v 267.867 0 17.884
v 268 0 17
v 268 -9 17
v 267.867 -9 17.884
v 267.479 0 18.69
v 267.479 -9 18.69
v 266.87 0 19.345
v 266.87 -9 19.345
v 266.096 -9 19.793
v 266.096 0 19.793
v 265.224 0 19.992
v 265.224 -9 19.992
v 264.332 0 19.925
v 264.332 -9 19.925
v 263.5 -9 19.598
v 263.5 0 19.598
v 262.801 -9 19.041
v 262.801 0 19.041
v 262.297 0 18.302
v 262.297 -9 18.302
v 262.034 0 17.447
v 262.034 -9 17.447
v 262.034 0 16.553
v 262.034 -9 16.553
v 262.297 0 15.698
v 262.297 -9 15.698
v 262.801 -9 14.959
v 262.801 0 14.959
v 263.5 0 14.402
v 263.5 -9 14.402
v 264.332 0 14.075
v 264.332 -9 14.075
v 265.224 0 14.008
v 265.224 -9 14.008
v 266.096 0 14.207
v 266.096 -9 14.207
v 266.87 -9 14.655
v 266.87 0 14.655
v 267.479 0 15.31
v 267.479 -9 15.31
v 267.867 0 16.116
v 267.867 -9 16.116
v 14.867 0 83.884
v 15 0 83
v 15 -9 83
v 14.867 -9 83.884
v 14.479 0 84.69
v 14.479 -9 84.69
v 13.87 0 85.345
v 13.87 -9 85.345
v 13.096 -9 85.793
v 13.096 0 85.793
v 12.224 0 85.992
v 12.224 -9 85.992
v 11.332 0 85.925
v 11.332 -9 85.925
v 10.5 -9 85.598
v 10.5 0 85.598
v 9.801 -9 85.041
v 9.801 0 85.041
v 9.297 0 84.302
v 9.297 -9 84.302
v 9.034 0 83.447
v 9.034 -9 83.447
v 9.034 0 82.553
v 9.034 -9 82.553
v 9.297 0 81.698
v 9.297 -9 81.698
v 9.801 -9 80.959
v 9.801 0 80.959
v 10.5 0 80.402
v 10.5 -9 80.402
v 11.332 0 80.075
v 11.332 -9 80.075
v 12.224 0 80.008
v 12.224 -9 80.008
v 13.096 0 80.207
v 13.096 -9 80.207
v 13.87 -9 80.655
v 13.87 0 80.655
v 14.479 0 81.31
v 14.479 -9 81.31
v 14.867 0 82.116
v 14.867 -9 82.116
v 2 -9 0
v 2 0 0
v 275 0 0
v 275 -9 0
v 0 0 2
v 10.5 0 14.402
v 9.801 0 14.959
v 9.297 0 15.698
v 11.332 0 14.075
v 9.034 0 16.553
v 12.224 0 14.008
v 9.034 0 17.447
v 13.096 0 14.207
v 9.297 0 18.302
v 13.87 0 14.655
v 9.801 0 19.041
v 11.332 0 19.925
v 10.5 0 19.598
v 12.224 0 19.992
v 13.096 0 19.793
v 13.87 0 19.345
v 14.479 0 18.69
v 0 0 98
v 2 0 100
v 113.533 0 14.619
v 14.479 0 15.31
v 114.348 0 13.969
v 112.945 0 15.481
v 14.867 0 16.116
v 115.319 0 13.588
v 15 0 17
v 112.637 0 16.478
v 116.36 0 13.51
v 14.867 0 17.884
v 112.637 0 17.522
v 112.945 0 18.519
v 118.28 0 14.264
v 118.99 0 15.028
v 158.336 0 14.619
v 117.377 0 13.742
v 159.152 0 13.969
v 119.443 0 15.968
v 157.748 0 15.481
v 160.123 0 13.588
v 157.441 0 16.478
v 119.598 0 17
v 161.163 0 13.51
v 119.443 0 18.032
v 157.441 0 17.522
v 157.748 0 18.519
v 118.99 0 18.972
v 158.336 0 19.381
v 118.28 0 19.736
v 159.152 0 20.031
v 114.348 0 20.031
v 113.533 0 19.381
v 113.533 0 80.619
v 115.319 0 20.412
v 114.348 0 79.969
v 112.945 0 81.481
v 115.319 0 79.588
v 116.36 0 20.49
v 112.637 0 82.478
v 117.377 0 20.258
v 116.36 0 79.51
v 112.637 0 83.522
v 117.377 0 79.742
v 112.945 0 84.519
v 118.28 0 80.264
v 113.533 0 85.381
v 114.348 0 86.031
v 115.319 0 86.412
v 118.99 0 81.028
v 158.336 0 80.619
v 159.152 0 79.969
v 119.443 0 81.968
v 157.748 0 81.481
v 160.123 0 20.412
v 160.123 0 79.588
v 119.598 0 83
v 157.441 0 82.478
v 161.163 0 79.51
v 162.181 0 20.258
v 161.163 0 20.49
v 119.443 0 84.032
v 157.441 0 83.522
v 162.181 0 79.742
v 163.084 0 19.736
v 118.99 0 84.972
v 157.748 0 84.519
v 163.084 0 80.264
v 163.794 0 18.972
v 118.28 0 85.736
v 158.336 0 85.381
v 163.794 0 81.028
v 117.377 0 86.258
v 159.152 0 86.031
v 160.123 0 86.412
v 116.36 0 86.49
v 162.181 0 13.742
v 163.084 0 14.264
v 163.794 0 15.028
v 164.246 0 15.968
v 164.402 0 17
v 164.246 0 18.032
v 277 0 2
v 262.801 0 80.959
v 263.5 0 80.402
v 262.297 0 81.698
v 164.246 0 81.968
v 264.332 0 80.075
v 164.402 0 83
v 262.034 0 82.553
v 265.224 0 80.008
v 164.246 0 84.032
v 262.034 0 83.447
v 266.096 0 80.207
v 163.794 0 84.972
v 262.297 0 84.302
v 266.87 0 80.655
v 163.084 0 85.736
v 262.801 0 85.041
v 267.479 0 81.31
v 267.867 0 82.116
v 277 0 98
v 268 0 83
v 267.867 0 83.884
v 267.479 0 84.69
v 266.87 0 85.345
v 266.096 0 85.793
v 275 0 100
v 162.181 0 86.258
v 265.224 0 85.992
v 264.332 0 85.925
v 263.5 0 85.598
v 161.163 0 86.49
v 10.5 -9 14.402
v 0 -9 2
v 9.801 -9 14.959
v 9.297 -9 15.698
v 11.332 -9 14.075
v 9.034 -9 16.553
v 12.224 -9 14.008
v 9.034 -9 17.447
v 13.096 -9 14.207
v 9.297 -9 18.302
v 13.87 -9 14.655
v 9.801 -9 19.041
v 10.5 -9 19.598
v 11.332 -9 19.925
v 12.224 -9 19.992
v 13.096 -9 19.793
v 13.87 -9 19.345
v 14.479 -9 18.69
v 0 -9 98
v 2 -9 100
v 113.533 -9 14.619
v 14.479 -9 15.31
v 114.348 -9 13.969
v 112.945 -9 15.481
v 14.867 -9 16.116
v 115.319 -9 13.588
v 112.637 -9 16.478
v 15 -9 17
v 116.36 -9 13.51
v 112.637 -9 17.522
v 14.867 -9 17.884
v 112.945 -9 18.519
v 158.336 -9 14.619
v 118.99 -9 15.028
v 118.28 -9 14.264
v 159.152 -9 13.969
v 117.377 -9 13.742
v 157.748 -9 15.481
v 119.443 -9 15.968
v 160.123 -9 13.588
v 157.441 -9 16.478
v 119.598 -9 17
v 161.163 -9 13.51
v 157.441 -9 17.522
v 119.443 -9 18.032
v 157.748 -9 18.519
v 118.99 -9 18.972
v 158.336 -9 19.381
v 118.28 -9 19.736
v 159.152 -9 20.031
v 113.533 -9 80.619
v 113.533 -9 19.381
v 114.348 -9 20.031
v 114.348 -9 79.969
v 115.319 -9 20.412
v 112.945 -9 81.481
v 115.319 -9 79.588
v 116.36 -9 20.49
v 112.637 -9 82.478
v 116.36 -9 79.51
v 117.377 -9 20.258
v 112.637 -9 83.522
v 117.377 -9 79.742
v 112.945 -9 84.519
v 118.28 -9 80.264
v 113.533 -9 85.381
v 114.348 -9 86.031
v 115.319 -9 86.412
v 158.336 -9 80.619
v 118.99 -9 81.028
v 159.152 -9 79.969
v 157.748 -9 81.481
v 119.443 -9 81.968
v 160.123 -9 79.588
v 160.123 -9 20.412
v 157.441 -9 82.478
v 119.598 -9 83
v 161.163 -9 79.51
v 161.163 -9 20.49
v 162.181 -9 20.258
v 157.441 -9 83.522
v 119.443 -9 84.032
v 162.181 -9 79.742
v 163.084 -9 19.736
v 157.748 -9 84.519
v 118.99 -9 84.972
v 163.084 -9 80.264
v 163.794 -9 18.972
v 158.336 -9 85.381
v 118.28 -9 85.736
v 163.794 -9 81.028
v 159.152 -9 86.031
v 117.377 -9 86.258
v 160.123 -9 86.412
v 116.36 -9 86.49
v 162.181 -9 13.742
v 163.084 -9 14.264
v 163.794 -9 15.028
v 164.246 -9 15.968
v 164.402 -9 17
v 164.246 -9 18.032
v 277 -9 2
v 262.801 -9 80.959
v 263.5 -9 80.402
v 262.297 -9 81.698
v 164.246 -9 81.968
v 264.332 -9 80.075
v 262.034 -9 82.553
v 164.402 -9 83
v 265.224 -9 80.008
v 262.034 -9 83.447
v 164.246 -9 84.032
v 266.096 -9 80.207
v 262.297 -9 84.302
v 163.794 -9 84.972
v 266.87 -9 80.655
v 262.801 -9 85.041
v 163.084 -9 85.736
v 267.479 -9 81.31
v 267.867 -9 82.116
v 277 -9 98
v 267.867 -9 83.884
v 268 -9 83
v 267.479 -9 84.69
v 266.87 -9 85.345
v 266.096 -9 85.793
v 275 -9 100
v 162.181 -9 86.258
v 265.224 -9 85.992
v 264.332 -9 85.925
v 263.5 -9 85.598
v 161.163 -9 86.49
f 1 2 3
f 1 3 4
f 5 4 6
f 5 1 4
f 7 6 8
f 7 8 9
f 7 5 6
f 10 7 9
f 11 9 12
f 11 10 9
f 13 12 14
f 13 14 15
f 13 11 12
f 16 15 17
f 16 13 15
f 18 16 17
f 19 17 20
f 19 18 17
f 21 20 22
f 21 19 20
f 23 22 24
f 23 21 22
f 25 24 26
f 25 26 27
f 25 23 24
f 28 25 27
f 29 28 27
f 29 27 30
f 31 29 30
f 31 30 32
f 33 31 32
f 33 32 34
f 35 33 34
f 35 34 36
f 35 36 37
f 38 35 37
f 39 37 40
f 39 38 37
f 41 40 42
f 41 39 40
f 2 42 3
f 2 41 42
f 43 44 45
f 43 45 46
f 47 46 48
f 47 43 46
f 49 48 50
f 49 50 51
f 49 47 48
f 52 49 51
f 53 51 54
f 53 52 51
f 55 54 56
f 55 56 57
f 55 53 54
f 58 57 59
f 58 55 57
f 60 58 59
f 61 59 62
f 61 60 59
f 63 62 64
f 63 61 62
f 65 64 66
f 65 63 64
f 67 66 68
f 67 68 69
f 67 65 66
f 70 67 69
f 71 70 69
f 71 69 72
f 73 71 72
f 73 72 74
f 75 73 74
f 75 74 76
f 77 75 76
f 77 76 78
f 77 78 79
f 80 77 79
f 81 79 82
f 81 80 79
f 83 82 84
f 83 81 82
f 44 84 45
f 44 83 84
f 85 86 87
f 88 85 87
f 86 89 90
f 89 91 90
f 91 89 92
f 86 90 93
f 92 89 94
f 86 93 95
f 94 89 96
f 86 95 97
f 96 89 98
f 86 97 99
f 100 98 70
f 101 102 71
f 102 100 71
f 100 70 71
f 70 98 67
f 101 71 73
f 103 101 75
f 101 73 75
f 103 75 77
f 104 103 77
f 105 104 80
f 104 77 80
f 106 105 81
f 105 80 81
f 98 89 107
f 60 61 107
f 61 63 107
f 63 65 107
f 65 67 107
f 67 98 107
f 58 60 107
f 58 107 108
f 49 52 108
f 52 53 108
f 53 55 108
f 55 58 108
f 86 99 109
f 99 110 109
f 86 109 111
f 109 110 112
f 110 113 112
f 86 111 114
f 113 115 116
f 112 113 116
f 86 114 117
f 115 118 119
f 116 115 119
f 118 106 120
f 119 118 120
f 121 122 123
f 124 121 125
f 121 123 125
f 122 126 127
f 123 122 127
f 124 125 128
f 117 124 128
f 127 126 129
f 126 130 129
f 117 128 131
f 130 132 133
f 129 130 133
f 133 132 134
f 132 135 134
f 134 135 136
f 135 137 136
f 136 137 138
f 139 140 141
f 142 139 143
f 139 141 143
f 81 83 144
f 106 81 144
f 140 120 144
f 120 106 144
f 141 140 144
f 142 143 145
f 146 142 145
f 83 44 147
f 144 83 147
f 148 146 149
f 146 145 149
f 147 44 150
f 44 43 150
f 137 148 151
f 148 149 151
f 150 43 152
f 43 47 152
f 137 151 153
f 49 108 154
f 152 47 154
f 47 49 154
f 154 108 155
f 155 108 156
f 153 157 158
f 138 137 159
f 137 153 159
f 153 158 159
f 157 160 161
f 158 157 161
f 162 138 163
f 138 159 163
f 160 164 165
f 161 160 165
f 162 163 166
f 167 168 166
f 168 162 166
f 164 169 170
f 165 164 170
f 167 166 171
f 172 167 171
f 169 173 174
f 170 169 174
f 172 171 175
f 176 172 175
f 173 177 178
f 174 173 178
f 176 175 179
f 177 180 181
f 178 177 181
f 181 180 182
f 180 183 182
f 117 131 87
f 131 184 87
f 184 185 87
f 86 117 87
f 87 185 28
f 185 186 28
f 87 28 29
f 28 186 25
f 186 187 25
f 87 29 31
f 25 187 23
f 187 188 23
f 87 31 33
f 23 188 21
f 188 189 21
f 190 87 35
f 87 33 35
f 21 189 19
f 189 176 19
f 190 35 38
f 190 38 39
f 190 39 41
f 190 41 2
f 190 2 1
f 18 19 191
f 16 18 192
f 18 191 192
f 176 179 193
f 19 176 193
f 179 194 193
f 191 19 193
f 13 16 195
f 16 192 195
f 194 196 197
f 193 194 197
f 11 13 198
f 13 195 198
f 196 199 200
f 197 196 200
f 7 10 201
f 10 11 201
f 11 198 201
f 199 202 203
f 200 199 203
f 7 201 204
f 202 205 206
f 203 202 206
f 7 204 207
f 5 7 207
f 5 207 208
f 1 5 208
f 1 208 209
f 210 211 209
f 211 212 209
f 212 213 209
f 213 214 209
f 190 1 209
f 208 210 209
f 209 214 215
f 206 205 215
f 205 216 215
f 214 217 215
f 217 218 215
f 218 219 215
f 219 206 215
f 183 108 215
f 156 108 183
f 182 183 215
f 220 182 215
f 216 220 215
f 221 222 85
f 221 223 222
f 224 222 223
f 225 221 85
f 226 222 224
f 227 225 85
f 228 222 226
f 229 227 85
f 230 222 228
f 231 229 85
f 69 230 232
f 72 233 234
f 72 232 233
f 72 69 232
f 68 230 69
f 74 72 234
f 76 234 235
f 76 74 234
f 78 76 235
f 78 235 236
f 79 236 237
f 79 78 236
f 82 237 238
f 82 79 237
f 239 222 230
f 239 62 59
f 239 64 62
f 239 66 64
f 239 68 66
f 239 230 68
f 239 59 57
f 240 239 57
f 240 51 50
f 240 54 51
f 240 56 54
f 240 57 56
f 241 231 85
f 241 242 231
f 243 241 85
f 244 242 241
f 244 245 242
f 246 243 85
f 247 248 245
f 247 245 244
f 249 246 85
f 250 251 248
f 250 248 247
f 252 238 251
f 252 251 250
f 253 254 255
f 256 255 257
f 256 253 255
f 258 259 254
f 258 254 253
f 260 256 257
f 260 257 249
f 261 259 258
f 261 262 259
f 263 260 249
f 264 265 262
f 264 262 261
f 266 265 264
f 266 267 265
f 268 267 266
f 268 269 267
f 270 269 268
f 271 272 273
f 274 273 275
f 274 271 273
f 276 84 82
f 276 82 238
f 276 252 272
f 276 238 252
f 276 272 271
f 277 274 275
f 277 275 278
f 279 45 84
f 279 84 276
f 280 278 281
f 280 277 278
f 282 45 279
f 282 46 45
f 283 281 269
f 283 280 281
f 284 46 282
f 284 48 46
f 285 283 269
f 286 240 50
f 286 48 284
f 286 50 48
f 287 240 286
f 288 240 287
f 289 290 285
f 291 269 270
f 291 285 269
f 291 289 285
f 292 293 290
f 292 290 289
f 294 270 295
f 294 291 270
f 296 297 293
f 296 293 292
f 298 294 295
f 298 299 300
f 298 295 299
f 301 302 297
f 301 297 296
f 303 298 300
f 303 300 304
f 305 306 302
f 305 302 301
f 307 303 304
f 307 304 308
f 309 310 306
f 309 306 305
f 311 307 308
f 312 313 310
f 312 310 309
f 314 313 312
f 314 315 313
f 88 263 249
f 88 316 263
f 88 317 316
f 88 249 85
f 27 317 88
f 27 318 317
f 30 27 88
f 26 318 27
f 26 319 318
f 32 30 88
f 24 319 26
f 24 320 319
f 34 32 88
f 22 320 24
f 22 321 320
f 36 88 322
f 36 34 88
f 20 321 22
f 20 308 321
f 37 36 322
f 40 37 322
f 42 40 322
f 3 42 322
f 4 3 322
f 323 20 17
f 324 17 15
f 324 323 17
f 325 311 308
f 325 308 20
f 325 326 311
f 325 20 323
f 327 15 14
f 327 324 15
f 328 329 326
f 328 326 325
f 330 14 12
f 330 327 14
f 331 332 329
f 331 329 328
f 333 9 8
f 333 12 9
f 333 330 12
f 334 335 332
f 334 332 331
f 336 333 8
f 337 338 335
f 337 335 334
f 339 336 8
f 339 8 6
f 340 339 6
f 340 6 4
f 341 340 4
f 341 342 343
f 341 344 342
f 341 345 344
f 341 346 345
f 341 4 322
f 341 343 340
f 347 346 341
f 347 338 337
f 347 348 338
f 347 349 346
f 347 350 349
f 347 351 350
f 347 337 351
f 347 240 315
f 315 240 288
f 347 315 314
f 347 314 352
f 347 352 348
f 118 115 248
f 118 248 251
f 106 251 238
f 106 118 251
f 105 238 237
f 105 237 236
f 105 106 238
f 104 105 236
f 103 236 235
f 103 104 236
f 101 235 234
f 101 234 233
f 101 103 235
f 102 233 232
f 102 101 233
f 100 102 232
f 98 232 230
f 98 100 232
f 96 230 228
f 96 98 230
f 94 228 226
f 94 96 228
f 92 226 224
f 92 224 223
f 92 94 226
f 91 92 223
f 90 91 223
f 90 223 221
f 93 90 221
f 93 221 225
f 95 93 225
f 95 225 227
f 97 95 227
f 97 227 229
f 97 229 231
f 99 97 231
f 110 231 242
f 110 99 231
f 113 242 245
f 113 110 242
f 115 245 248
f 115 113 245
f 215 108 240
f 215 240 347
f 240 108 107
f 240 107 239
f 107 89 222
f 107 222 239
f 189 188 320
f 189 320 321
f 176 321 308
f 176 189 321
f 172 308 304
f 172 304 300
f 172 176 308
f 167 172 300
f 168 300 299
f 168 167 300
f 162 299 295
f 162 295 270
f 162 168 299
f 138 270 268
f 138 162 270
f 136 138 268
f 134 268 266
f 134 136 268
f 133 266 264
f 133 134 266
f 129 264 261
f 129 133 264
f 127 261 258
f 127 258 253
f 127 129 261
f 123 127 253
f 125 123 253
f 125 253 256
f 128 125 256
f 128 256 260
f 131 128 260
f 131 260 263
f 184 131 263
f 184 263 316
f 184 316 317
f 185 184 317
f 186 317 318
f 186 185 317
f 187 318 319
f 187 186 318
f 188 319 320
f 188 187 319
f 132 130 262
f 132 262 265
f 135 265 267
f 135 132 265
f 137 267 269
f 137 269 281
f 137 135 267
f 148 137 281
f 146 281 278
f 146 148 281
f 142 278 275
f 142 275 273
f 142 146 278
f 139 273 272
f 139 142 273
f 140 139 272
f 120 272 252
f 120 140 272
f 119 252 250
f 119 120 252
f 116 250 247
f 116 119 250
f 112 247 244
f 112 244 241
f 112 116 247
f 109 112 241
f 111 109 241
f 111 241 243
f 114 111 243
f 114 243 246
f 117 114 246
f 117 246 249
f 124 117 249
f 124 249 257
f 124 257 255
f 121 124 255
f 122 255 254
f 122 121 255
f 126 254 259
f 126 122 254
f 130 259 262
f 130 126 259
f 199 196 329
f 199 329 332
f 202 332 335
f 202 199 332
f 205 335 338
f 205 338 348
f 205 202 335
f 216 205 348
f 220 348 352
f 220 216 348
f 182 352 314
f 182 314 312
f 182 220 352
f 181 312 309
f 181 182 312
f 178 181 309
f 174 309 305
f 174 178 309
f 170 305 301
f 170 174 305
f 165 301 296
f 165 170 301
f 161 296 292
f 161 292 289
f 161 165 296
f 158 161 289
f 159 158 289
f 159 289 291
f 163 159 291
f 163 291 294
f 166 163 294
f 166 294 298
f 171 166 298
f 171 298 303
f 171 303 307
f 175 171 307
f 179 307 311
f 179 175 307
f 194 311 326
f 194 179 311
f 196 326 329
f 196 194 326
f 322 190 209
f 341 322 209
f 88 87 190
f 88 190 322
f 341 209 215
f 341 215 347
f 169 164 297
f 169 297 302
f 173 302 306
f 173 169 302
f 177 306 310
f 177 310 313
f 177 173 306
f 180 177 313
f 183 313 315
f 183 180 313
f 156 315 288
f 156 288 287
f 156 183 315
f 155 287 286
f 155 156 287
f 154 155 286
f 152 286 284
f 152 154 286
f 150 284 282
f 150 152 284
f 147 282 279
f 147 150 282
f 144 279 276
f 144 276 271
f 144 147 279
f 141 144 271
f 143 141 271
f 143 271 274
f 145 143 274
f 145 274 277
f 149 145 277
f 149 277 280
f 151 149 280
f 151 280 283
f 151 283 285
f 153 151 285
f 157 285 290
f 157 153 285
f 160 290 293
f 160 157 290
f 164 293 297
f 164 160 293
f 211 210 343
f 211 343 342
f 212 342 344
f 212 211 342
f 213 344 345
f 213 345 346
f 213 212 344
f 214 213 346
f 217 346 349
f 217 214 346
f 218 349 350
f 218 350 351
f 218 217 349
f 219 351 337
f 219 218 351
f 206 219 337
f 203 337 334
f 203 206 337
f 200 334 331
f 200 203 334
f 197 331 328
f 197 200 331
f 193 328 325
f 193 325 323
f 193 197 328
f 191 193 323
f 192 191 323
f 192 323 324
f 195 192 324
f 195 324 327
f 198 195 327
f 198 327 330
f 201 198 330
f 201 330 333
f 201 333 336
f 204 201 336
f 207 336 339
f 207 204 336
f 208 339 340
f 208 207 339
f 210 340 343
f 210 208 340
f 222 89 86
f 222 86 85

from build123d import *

# Parameters (mm, degrees)
F0_W     = 277
F0_H     = 100
F0_R     = 3
F0_R_2   = 3.5
F1_DEPTH = 9
F2_SIZE  = 2
F3_SIZE  = 2
F4_SIZE  = 2
F5_SIZE  = 2


with BuildPart() as f1:
    # F0 (on Front) → F1 (new body)
    with BuildSketch(Plane.XZ):
        with Locations((138.5, 50)):
            Rectangle(F0_W, F0_H)
        with Locations((12, 17)):
            Circle(F0_R, mode=Mode.SUBTRACT)
        with Locations((116.098186, 17)):
            Circle(F0_R_2, mode=Mode.SUBTRACT)
        with Locations((160.901814, 17)):
            Circle(F0_R_2, mode=Mode.SUBTRACT)
        with Locations((265, 17)):
            Circle(F0_R, mode=Mode.SUBTRACT)
        with Locations((12, 83)):
            Circle(F0_R, mode=Mode.SUBTRACT)
        with Locations((116.098186, 83)):
            Circle(F0_R_2, mode=Mode.SUBTRACT)
        with Locations((160.901814, 83)):
            Circle(F0_R_2, mode=Mode.SUBTRACT)
        with Locations((265, 83)):
            Circle(F0_R, mode=Mode.SUBTRACT)
    extrude(amount=F1_DEPTH)

    # F2
    f2_edges = [f1.edges().sort_by_distance(p)[0] for p in [
        (277, -4.5, 100),
    ]]
    chamfer(f2_edges, length=F2_SIZE)

    # F3
    f3_edges = [f1.edges().sort_by_distance(p)[0] for p in [
        (277, -4.5, 0),
    ]]
    chamfer(f3_edges, length=F3_SIZE)

    # F4
    f4_edges = [f1.edges().sort_by_distance(p)[0] for p in [
        (0, -4.5, 0),
    ]]
    chamfer(f4_edges, length=F4_SIZE)

    # F5
    f5_edges = [f1.edges().sort_by_distance(p)[0] for p in [
        (0, -4.5, 100),
    ]]
    chamfer(f5_edges, length=F5_SIZE)


solid = f1.part
